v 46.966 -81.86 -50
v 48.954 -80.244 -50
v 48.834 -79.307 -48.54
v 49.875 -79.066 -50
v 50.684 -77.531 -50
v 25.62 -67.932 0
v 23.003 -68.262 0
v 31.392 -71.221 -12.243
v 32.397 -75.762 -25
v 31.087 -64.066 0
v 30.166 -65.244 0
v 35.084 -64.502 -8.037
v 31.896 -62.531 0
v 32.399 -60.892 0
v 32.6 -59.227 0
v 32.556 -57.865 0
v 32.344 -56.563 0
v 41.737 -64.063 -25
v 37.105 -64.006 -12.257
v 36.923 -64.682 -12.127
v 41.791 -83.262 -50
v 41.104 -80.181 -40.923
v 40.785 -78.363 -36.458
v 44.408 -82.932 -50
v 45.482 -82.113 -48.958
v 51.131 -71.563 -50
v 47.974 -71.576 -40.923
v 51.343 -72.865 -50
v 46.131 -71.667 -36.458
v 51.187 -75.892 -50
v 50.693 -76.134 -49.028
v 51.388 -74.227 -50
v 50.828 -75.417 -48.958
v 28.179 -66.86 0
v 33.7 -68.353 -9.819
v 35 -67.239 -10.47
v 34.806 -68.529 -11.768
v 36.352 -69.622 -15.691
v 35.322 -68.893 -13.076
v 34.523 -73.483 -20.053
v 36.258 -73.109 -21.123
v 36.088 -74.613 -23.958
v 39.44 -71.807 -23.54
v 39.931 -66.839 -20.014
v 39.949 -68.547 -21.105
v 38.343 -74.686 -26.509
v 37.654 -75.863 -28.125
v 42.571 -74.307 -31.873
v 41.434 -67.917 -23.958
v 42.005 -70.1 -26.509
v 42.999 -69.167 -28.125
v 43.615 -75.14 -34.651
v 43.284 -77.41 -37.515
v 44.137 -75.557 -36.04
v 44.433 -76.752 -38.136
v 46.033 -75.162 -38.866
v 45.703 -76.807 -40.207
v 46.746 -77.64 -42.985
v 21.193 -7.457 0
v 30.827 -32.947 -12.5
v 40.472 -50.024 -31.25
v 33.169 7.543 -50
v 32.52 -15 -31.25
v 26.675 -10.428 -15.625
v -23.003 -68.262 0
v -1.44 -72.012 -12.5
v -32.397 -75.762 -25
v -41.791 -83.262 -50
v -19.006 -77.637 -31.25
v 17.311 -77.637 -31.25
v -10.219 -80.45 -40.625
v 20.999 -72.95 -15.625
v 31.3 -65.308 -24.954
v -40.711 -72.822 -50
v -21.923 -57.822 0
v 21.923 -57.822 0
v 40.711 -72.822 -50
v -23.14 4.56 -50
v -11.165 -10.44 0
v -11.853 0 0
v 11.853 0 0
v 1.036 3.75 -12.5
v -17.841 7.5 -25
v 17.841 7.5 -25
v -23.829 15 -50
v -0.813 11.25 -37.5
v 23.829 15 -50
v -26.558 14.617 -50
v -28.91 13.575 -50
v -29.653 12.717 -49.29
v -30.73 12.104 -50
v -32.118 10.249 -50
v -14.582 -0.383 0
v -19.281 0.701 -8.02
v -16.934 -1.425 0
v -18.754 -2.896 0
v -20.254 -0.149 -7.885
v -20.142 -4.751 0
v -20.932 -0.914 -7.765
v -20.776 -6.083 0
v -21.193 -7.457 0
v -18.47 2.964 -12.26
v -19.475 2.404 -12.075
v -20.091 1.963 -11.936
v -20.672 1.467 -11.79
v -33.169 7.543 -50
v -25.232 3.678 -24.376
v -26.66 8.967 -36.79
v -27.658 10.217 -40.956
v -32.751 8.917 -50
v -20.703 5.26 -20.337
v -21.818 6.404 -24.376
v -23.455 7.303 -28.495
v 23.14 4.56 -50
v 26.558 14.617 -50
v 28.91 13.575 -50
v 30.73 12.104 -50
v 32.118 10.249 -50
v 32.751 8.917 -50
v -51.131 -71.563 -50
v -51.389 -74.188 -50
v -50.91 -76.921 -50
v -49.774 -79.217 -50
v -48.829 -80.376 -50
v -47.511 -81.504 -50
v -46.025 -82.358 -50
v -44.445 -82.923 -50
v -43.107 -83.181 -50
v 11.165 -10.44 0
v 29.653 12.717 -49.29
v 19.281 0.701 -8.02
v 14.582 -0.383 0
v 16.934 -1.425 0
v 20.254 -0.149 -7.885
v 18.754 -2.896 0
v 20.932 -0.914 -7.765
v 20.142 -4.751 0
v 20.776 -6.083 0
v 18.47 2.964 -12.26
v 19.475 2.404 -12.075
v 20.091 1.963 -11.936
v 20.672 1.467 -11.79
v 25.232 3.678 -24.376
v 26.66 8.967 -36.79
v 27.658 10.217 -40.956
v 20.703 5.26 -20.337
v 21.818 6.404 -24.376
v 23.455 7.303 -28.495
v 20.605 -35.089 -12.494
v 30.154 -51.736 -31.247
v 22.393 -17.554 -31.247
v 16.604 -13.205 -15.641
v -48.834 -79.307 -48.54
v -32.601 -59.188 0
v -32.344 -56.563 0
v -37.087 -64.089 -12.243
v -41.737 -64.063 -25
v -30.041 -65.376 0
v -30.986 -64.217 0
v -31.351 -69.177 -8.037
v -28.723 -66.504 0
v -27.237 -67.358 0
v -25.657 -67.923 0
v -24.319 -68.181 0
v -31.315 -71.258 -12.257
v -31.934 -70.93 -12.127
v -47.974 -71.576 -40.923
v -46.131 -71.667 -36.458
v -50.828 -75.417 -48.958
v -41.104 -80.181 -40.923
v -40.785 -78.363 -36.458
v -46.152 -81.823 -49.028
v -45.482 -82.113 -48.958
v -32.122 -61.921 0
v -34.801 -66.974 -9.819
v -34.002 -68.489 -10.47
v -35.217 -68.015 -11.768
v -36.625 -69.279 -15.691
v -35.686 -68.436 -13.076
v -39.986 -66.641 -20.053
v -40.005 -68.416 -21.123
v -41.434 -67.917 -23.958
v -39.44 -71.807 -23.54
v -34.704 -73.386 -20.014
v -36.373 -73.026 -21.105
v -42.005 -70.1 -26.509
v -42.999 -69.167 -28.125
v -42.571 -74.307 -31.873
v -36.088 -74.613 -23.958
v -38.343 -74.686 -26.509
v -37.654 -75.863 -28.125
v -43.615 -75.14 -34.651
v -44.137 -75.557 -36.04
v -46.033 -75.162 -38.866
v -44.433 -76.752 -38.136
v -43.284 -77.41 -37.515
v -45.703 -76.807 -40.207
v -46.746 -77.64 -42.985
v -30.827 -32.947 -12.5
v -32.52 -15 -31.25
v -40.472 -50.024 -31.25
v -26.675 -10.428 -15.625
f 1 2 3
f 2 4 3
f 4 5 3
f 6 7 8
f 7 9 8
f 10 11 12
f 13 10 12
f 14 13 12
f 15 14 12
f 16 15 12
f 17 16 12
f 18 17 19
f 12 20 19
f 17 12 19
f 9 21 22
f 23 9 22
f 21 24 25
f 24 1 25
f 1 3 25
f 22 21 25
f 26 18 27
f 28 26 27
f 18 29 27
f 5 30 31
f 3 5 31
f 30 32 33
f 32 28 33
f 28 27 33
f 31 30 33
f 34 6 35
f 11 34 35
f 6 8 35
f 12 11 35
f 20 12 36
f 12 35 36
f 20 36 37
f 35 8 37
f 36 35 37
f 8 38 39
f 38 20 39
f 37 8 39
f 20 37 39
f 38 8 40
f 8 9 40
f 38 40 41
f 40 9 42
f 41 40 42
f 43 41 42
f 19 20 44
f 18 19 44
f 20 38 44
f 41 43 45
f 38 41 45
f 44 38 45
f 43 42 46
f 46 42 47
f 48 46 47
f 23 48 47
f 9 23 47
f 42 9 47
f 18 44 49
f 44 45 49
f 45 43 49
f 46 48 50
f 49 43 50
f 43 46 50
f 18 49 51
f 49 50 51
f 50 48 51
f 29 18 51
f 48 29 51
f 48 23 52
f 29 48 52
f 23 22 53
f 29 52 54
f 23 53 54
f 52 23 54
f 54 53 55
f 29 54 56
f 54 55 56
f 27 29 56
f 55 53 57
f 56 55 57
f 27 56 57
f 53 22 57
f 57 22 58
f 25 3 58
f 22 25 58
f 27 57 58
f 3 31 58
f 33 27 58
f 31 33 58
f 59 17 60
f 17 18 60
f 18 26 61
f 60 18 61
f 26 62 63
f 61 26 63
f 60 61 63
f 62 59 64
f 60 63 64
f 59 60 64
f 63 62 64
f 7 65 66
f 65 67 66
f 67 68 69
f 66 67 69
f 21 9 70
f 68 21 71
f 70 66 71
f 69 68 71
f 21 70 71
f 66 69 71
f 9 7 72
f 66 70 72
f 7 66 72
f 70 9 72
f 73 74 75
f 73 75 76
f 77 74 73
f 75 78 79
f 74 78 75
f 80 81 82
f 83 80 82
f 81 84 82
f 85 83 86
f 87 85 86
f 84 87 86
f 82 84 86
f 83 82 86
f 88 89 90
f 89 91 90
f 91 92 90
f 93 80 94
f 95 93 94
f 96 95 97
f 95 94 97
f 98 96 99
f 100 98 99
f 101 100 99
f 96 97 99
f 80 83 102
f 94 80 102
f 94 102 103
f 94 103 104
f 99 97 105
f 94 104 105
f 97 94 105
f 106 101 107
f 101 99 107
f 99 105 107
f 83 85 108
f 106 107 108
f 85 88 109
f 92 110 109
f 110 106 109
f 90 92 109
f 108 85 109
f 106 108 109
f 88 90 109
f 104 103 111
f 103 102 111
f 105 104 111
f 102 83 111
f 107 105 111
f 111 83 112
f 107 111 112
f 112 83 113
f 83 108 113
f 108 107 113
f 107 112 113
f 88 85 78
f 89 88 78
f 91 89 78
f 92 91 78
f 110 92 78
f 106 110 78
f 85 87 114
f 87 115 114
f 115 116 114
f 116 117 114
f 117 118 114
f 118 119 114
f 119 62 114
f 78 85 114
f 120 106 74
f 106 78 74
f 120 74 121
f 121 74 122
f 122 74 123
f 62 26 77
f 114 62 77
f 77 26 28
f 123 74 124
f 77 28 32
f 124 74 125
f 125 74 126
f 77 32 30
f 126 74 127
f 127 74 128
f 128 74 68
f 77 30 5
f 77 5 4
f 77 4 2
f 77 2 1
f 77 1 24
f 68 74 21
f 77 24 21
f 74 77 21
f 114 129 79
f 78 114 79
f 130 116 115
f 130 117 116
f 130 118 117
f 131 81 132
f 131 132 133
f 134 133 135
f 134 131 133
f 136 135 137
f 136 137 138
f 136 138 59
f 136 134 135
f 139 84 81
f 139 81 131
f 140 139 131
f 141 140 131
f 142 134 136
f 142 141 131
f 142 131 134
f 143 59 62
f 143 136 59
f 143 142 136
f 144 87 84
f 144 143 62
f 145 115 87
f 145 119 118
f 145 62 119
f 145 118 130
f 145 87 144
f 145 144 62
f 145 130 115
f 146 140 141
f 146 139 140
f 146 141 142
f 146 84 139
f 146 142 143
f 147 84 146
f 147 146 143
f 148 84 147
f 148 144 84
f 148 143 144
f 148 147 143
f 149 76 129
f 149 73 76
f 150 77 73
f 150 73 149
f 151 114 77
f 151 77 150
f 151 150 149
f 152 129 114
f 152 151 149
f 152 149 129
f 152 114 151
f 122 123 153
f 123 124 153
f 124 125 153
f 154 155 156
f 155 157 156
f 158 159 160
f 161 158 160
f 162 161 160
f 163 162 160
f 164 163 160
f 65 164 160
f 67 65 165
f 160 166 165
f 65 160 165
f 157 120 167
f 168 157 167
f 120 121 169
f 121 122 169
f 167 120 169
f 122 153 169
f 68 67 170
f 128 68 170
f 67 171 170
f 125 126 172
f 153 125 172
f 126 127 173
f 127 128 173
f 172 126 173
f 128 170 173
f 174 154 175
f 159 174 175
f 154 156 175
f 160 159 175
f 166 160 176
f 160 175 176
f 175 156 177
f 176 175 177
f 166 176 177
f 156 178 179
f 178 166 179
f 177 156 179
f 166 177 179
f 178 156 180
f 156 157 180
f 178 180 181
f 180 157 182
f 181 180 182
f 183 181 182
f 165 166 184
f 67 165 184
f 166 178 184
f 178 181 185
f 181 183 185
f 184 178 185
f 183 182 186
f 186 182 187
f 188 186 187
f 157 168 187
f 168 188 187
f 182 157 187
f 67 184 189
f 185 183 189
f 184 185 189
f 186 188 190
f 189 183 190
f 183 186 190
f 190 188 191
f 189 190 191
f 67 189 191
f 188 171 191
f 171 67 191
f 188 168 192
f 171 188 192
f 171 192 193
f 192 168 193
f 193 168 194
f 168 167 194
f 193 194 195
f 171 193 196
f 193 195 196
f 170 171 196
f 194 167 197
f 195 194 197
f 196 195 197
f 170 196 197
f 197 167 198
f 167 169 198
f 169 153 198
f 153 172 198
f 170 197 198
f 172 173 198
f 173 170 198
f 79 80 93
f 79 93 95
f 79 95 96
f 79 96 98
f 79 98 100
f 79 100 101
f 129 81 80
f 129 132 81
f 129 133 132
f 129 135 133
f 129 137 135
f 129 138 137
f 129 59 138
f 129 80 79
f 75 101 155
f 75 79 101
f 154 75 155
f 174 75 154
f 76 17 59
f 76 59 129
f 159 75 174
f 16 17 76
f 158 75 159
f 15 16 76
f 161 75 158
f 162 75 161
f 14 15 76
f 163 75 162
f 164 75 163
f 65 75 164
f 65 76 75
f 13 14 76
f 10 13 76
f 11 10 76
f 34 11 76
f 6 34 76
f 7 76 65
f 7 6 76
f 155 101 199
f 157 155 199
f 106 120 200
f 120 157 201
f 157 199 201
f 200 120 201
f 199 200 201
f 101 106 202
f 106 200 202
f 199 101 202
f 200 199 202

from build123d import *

# Parameters (mm, degrees)
F4_T = -10
F5_R = 10


with BuildPart() as f3:
    # F0 (on Top) → F3 section 0
    with BuildSketch(Plane.XY):
        Polygon((19.5, 0), (0, 0), (-19.5, 0), (-35, -68.2623615179), (0, -68.2623615179), (35, -68.2623615179), align=None)
    # F2 (on offset) → F3 section 1
    with BuildSketch(Plane.XY.offset(-50)):
        Polygon((0, -83.2623615179), (53.7878059224, -83.2623615179), (31.4758528979, 15), (0, 15), (-31.4758528979, 15), (-53.7878059224, -83.2623615179), align=None)
    loft()

    # F4
    f4_openings = [f3.faces().sort_by_distance(p)[0] for p in [
        (0, -37.366858, 0),
        (0, -38.41676, -50),
    ]]
    offset(amount=F4_T, openings=f4_openings, kind=Kind.INTERSECTION)

    # F5
    f5_edges = [f3.edges().sort_by_distance(p)[0] for p in [
        (-25.487926, 7.5, -25),
        (-44.393903, -75.762362, -25),
        (44.393903, -75.762362, -25),
        (25.487926, 7.5, -25),
    ]]
    fillet(f5_edges, radius=F5_R)


solid = f3.part
